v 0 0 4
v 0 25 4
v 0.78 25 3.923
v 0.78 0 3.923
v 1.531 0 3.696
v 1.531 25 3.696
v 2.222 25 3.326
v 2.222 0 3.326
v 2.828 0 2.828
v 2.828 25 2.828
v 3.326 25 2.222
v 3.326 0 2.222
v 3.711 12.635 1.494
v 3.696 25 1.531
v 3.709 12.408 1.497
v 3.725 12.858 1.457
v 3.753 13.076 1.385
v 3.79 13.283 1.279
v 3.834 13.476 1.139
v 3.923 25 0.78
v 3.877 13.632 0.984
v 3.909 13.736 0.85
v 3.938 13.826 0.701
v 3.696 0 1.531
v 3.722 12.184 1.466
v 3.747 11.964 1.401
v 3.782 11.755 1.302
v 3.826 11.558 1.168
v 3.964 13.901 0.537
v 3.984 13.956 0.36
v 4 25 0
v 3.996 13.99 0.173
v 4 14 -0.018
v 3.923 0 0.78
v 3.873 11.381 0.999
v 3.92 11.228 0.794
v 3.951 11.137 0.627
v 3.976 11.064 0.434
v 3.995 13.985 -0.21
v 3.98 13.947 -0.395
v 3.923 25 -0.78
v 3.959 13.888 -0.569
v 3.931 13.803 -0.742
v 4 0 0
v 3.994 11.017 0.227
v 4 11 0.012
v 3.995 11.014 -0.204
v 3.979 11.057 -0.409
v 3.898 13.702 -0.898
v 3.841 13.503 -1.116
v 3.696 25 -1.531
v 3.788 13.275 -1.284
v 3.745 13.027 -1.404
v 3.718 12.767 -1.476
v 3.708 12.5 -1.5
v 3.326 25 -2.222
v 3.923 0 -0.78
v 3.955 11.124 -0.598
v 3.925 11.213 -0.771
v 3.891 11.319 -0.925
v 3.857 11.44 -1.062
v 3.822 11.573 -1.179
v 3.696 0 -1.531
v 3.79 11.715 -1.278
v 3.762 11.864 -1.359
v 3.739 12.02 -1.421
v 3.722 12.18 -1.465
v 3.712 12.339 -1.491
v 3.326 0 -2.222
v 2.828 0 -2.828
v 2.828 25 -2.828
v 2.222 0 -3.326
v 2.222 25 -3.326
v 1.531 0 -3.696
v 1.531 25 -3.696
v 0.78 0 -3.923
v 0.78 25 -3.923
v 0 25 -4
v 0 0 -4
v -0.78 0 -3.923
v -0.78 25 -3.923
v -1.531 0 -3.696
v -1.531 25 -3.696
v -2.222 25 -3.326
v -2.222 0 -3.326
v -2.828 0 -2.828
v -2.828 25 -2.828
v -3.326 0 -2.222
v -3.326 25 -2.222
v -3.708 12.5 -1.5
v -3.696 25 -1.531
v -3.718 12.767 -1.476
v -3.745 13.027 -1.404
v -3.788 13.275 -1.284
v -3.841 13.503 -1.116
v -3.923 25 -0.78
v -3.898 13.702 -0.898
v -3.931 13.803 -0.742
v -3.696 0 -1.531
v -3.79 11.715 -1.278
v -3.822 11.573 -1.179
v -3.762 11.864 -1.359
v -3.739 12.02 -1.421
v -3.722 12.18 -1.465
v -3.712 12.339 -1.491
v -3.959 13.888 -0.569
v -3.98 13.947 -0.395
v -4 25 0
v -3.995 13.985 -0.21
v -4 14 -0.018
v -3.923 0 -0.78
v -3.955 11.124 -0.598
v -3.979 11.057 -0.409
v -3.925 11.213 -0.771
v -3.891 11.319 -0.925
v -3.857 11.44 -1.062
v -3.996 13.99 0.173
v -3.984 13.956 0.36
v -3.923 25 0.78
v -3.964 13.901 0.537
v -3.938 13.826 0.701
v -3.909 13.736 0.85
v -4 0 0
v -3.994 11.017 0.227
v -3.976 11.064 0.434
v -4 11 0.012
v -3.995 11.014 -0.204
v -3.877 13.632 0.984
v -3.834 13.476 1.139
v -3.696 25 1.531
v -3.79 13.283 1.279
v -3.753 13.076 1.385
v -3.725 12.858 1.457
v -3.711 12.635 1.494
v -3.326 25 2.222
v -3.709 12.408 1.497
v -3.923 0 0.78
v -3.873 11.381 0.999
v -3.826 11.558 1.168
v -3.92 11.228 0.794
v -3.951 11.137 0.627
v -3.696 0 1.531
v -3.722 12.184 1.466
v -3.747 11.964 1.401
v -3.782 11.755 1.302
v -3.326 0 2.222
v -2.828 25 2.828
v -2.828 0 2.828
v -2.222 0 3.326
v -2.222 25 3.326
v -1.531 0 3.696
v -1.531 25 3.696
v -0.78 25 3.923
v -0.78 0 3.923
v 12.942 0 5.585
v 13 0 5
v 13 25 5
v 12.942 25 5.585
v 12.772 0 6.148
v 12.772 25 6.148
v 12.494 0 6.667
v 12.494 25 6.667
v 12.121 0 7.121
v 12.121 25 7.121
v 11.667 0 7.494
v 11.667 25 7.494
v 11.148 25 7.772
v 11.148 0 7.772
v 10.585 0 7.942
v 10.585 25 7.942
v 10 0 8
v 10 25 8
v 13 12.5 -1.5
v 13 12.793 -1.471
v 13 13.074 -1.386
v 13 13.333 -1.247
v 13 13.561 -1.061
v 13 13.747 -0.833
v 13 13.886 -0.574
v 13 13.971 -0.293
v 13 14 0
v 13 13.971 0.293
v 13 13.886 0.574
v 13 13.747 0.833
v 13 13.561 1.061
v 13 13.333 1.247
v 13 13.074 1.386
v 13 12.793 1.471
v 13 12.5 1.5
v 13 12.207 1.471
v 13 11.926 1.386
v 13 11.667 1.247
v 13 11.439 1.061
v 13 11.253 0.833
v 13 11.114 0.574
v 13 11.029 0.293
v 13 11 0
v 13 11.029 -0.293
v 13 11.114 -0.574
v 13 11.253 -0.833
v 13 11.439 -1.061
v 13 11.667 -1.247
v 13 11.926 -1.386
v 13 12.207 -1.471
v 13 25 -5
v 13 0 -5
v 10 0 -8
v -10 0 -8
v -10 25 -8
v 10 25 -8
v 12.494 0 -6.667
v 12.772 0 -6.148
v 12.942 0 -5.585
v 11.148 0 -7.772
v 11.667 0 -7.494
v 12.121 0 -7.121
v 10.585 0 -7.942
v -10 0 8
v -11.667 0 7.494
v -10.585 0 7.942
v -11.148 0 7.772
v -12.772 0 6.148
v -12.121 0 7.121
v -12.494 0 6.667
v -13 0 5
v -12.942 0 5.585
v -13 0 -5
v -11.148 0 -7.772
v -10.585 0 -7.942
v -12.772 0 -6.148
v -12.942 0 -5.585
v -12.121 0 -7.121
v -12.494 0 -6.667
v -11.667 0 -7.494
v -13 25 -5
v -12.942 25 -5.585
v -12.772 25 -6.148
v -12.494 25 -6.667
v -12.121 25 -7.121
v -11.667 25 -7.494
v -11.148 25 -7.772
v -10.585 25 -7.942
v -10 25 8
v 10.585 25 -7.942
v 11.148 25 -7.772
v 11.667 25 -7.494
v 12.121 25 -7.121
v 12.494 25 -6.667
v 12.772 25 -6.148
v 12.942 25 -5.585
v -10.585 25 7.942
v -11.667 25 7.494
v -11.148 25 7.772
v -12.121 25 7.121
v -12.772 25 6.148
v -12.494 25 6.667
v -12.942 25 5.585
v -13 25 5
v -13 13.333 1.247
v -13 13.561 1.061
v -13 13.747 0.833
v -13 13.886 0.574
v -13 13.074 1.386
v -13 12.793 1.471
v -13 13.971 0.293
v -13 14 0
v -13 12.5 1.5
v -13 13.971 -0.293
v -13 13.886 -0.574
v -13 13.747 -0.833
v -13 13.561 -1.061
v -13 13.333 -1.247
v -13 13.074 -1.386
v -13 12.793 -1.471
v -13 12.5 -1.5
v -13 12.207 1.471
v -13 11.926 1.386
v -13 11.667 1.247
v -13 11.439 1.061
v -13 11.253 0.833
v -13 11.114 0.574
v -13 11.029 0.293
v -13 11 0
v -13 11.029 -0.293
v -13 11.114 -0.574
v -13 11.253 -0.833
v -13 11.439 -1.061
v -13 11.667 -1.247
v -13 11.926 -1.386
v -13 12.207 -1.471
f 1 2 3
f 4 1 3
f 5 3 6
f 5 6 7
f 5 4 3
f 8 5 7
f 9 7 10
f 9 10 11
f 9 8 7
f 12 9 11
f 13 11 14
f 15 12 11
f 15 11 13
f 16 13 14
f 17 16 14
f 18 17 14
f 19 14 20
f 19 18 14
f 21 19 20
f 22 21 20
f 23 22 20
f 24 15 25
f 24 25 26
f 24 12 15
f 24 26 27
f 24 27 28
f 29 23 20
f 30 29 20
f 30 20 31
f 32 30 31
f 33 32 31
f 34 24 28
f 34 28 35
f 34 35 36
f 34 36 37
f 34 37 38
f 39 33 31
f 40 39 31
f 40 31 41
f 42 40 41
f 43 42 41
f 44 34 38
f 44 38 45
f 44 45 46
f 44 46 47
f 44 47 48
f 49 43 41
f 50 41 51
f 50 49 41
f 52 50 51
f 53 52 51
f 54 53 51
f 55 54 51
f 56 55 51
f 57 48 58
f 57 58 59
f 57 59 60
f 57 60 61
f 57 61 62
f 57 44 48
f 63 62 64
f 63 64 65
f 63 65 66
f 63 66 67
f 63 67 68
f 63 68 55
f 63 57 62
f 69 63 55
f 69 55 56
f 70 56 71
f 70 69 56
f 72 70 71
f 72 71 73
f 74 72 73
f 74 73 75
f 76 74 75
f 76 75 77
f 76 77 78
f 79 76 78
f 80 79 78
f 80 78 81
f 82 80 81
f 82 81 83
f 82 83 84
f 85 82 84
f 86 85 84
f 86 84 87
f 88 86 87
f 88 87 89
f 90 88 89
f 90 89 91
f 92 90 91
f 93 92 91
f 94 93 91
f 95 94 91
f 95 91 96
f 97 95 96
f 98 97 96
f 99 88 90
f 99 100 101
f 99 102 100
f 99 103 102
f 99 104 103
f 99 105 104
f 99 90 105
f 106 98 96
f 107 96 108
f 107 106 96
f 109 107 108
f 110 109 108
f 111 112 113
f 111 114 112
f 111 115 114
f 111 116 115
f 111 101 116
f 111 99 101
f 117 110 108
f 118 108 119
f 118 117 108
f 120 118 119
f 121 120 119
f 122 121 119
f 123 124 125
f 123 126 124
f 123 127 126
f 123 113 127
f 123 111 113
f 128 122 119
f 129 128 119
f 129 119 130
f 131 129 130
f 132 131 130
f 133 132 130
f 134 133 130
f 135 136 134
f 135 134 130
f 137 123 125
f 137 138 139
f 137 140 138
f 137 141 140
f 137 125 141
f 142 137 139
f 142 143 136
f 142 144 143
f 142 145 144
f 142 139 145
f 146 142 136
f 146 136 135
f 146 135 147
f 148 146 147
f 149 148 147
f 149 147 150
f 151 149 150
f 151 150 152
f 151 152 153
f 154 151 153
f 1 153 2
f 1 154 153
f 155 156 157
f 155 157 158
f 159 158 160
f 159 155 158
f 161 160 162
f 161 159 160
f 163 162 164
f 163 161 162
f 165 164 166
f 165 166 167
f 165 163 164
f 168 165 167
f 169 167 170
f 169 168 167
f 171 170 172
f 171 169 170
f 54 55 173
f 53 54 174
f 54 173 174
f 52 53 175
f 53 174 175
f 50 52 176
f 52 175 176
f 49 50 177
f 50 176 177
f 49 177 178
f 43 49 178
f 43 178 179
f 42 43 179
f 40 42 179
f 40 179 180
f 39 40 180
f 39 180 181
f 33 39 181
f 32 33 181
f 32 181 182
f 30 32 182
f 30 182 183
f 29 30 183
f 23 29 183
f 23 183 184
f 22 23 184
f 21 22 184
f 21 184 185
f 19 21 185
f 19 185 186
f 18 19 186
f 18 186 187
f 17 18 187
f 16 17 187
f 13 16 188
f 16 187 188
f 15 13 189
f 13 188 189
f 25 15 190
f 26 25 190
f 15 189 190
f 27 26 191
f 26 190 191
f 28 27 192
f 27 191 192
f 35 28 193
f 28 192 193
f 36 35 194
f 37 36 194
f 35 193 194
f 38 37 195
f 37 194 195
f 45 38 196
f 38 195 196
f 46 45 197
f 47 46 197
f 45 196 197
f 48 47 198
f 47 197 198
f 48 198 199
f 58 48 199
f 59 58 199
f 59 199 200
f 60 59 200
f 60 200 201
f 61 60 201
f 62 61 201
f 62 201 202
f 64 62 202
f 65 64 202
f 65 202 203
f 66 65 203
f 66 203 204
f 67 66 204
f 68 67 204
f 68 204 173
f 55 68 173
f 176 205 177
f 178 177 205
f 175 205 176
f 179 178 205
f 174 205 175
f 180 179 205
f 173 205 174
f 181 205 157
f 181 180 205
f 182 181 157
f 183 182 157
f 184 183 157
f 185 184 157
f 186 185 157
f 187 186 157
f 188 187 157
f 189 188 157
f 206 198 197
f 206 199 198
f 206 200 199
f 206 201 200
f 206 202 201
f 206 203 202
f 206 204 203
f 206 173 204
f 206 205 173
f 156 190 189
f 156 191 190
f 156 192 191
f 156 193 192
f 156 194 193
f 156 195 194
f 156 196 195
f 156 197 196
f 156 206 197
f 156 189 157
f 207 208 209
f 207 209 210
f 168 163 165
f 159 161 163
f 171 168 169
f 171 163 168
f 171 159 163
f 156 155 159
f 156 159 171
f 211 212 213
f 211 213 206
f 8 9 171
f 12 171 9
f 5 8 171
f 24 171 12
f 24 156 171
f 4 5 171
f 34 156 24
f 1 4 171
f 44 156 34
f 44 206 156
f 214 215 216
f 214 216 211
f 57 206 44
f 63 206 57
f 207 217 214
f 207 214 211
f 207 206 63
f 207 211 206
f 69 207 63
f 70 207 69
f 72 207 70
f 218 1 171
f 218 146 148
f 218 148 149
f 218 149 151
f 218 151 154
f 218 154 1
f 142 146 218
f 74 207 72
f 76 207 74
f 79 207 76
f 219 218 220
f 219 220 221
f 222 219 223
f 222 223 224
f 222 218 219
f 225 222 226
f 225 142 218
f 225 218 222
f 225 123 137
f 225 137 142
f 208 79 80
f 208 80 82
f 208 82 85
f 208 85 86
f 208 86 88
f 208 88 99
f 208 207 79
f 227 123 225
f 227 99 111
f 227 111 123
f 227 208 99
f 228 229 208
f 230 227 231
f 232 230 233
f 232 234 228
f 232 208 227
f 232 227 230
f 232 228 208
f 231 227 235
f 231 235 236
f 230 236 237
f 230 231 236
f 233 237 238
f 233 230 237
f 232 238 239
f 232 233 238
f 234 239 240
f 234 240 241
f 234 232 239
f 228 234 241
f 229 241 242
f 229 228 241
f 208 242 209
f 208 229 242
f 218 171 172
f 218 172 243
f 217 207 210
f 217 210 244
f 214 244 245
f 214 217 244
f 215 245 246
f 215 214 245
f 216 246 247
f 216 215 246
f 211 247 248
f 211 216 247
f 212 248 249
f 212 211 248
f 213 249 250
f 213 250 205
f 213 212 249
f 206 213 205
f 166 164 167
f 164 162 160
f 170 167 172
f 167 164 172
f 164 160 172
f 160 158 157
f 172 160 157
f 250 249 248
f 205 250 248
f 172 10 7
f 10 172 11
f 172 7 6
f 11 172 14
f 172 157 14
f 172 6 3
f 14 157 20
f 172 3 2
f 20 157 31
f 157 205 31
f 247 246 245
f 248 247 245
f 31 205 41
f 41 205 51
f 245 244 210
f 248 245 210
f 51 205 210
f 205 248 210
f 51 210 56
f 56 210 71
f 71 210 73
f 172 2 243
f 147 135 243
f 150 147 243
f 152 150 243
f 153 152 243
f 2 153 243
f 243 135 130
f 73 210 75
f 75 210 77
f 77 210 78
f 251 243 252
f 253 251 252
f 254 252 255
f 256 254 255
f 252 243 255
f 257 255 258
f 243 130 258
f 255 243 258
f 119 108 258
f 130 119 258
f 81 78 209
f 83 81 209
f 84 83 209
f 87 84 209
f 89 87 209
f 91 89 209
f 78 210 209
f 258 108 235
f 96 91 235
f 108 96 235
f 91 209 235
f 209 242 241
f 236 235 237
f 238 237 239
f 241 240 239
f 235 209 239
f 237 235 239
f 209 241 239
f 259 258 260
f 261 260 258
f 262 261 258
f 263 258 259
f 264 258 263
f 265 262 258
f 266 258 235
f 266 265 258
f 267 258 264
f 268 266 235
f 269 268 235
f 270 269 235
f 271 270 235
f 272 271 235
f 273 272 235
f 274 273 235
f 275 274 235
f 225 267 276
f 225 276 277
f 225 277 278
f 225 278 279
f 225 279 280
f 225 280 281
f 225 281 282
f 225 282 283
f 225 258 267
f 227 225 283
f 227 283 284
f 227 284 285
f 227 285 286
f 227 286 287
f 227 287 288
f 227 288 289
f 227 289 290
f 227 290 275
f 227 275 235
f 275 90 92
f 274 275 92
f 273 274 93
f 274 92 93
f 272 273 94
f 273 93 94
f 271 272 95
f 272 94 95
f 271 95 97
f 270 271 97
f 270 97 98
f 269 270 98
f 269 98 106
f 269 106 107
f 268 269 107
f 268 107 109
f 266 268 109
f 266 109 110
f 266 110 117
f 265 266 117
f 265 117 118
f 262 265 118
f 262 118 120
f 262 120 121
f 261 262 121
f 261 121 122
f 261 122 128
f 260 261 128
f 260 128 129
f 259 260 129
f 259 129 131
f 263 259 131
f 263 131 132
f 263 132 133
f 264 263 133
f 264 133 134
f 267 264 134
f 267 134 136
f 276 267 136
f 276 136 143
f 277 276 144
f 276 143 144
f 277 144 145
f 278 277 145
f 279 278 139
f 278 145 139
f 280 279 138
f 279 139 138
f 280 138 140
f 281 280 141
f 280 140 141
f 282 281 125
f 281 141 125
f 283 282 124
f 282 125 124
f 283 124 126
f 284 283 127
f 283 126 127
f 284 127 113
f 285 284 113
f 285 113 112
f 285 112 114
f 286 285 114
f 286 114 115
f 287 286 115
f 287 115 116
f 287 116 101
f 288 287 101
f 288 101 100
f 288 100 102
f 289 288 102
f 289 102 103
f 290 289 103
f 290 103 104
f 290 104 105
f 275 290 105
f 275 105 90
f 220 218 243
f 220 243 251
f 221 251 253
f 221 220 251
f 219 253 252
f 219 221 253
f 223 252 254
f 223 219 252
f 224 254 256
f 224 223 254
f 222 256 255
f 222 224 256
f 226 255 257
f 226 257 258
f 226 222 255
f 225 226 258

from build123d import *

# Parameters (mm, degrees)
SKETCH1_R           = 4
BOSS_EXTRUDE1_DEPTH = 25
SKETCH2_R           = 1.5
CUT_EXTRUDE1_DEPTH  = 46


with BuildPart() as part:
    # Sketch1 → Boss-Extrude1 (new body)
    with BuildSketch(Plane(origin=(0, 0, 0), x_dir=(1, 0, 0), z_dir=(0, 1, 0))):
        with BuildLine():
            Line((10, -8), (-10, -8))
            ThreePointArc((-10, -8), (-12.121320344, -7.121320344), (-13, -5))
            Line((-13, -5), (-13, 5))
            ThreePointArc((-13, 5), (-12.121320344, 7.121320344), (-10, 8))
            Line((-10, 8), (10, 8))
            ThreePointArc((10, 8), (12.121320344, 7.121320344), (13, 5))
            Line((13, 5), (13, -5))
            ThreePointArc((13, -5), (12.121320344, -7.121320344), (10, -8))
        make_face()
        with Locations(Location((0, 0, 0), (0, 0, 270))):
            Circle(SKETCH1_R, mode=Mode.SUBTRACT)
    extrude(amount=BOSS_EXTRUDE1_DEPTH)

    # Sketch2 → Cut-Extrude1 (cut)
    with BuildSketch(Plane(origin=(13, 0, 0), x_dir=(0, 0, -1), z_dir=(1, 0, 0))):
        with Locations((0, 12.5)):
            Circle(SKETCH2_R)
    extrude(amount=-CUT_EXTRUDE1_DEPTH, mode=Mode.SUBTRACT)


solid = part.part
